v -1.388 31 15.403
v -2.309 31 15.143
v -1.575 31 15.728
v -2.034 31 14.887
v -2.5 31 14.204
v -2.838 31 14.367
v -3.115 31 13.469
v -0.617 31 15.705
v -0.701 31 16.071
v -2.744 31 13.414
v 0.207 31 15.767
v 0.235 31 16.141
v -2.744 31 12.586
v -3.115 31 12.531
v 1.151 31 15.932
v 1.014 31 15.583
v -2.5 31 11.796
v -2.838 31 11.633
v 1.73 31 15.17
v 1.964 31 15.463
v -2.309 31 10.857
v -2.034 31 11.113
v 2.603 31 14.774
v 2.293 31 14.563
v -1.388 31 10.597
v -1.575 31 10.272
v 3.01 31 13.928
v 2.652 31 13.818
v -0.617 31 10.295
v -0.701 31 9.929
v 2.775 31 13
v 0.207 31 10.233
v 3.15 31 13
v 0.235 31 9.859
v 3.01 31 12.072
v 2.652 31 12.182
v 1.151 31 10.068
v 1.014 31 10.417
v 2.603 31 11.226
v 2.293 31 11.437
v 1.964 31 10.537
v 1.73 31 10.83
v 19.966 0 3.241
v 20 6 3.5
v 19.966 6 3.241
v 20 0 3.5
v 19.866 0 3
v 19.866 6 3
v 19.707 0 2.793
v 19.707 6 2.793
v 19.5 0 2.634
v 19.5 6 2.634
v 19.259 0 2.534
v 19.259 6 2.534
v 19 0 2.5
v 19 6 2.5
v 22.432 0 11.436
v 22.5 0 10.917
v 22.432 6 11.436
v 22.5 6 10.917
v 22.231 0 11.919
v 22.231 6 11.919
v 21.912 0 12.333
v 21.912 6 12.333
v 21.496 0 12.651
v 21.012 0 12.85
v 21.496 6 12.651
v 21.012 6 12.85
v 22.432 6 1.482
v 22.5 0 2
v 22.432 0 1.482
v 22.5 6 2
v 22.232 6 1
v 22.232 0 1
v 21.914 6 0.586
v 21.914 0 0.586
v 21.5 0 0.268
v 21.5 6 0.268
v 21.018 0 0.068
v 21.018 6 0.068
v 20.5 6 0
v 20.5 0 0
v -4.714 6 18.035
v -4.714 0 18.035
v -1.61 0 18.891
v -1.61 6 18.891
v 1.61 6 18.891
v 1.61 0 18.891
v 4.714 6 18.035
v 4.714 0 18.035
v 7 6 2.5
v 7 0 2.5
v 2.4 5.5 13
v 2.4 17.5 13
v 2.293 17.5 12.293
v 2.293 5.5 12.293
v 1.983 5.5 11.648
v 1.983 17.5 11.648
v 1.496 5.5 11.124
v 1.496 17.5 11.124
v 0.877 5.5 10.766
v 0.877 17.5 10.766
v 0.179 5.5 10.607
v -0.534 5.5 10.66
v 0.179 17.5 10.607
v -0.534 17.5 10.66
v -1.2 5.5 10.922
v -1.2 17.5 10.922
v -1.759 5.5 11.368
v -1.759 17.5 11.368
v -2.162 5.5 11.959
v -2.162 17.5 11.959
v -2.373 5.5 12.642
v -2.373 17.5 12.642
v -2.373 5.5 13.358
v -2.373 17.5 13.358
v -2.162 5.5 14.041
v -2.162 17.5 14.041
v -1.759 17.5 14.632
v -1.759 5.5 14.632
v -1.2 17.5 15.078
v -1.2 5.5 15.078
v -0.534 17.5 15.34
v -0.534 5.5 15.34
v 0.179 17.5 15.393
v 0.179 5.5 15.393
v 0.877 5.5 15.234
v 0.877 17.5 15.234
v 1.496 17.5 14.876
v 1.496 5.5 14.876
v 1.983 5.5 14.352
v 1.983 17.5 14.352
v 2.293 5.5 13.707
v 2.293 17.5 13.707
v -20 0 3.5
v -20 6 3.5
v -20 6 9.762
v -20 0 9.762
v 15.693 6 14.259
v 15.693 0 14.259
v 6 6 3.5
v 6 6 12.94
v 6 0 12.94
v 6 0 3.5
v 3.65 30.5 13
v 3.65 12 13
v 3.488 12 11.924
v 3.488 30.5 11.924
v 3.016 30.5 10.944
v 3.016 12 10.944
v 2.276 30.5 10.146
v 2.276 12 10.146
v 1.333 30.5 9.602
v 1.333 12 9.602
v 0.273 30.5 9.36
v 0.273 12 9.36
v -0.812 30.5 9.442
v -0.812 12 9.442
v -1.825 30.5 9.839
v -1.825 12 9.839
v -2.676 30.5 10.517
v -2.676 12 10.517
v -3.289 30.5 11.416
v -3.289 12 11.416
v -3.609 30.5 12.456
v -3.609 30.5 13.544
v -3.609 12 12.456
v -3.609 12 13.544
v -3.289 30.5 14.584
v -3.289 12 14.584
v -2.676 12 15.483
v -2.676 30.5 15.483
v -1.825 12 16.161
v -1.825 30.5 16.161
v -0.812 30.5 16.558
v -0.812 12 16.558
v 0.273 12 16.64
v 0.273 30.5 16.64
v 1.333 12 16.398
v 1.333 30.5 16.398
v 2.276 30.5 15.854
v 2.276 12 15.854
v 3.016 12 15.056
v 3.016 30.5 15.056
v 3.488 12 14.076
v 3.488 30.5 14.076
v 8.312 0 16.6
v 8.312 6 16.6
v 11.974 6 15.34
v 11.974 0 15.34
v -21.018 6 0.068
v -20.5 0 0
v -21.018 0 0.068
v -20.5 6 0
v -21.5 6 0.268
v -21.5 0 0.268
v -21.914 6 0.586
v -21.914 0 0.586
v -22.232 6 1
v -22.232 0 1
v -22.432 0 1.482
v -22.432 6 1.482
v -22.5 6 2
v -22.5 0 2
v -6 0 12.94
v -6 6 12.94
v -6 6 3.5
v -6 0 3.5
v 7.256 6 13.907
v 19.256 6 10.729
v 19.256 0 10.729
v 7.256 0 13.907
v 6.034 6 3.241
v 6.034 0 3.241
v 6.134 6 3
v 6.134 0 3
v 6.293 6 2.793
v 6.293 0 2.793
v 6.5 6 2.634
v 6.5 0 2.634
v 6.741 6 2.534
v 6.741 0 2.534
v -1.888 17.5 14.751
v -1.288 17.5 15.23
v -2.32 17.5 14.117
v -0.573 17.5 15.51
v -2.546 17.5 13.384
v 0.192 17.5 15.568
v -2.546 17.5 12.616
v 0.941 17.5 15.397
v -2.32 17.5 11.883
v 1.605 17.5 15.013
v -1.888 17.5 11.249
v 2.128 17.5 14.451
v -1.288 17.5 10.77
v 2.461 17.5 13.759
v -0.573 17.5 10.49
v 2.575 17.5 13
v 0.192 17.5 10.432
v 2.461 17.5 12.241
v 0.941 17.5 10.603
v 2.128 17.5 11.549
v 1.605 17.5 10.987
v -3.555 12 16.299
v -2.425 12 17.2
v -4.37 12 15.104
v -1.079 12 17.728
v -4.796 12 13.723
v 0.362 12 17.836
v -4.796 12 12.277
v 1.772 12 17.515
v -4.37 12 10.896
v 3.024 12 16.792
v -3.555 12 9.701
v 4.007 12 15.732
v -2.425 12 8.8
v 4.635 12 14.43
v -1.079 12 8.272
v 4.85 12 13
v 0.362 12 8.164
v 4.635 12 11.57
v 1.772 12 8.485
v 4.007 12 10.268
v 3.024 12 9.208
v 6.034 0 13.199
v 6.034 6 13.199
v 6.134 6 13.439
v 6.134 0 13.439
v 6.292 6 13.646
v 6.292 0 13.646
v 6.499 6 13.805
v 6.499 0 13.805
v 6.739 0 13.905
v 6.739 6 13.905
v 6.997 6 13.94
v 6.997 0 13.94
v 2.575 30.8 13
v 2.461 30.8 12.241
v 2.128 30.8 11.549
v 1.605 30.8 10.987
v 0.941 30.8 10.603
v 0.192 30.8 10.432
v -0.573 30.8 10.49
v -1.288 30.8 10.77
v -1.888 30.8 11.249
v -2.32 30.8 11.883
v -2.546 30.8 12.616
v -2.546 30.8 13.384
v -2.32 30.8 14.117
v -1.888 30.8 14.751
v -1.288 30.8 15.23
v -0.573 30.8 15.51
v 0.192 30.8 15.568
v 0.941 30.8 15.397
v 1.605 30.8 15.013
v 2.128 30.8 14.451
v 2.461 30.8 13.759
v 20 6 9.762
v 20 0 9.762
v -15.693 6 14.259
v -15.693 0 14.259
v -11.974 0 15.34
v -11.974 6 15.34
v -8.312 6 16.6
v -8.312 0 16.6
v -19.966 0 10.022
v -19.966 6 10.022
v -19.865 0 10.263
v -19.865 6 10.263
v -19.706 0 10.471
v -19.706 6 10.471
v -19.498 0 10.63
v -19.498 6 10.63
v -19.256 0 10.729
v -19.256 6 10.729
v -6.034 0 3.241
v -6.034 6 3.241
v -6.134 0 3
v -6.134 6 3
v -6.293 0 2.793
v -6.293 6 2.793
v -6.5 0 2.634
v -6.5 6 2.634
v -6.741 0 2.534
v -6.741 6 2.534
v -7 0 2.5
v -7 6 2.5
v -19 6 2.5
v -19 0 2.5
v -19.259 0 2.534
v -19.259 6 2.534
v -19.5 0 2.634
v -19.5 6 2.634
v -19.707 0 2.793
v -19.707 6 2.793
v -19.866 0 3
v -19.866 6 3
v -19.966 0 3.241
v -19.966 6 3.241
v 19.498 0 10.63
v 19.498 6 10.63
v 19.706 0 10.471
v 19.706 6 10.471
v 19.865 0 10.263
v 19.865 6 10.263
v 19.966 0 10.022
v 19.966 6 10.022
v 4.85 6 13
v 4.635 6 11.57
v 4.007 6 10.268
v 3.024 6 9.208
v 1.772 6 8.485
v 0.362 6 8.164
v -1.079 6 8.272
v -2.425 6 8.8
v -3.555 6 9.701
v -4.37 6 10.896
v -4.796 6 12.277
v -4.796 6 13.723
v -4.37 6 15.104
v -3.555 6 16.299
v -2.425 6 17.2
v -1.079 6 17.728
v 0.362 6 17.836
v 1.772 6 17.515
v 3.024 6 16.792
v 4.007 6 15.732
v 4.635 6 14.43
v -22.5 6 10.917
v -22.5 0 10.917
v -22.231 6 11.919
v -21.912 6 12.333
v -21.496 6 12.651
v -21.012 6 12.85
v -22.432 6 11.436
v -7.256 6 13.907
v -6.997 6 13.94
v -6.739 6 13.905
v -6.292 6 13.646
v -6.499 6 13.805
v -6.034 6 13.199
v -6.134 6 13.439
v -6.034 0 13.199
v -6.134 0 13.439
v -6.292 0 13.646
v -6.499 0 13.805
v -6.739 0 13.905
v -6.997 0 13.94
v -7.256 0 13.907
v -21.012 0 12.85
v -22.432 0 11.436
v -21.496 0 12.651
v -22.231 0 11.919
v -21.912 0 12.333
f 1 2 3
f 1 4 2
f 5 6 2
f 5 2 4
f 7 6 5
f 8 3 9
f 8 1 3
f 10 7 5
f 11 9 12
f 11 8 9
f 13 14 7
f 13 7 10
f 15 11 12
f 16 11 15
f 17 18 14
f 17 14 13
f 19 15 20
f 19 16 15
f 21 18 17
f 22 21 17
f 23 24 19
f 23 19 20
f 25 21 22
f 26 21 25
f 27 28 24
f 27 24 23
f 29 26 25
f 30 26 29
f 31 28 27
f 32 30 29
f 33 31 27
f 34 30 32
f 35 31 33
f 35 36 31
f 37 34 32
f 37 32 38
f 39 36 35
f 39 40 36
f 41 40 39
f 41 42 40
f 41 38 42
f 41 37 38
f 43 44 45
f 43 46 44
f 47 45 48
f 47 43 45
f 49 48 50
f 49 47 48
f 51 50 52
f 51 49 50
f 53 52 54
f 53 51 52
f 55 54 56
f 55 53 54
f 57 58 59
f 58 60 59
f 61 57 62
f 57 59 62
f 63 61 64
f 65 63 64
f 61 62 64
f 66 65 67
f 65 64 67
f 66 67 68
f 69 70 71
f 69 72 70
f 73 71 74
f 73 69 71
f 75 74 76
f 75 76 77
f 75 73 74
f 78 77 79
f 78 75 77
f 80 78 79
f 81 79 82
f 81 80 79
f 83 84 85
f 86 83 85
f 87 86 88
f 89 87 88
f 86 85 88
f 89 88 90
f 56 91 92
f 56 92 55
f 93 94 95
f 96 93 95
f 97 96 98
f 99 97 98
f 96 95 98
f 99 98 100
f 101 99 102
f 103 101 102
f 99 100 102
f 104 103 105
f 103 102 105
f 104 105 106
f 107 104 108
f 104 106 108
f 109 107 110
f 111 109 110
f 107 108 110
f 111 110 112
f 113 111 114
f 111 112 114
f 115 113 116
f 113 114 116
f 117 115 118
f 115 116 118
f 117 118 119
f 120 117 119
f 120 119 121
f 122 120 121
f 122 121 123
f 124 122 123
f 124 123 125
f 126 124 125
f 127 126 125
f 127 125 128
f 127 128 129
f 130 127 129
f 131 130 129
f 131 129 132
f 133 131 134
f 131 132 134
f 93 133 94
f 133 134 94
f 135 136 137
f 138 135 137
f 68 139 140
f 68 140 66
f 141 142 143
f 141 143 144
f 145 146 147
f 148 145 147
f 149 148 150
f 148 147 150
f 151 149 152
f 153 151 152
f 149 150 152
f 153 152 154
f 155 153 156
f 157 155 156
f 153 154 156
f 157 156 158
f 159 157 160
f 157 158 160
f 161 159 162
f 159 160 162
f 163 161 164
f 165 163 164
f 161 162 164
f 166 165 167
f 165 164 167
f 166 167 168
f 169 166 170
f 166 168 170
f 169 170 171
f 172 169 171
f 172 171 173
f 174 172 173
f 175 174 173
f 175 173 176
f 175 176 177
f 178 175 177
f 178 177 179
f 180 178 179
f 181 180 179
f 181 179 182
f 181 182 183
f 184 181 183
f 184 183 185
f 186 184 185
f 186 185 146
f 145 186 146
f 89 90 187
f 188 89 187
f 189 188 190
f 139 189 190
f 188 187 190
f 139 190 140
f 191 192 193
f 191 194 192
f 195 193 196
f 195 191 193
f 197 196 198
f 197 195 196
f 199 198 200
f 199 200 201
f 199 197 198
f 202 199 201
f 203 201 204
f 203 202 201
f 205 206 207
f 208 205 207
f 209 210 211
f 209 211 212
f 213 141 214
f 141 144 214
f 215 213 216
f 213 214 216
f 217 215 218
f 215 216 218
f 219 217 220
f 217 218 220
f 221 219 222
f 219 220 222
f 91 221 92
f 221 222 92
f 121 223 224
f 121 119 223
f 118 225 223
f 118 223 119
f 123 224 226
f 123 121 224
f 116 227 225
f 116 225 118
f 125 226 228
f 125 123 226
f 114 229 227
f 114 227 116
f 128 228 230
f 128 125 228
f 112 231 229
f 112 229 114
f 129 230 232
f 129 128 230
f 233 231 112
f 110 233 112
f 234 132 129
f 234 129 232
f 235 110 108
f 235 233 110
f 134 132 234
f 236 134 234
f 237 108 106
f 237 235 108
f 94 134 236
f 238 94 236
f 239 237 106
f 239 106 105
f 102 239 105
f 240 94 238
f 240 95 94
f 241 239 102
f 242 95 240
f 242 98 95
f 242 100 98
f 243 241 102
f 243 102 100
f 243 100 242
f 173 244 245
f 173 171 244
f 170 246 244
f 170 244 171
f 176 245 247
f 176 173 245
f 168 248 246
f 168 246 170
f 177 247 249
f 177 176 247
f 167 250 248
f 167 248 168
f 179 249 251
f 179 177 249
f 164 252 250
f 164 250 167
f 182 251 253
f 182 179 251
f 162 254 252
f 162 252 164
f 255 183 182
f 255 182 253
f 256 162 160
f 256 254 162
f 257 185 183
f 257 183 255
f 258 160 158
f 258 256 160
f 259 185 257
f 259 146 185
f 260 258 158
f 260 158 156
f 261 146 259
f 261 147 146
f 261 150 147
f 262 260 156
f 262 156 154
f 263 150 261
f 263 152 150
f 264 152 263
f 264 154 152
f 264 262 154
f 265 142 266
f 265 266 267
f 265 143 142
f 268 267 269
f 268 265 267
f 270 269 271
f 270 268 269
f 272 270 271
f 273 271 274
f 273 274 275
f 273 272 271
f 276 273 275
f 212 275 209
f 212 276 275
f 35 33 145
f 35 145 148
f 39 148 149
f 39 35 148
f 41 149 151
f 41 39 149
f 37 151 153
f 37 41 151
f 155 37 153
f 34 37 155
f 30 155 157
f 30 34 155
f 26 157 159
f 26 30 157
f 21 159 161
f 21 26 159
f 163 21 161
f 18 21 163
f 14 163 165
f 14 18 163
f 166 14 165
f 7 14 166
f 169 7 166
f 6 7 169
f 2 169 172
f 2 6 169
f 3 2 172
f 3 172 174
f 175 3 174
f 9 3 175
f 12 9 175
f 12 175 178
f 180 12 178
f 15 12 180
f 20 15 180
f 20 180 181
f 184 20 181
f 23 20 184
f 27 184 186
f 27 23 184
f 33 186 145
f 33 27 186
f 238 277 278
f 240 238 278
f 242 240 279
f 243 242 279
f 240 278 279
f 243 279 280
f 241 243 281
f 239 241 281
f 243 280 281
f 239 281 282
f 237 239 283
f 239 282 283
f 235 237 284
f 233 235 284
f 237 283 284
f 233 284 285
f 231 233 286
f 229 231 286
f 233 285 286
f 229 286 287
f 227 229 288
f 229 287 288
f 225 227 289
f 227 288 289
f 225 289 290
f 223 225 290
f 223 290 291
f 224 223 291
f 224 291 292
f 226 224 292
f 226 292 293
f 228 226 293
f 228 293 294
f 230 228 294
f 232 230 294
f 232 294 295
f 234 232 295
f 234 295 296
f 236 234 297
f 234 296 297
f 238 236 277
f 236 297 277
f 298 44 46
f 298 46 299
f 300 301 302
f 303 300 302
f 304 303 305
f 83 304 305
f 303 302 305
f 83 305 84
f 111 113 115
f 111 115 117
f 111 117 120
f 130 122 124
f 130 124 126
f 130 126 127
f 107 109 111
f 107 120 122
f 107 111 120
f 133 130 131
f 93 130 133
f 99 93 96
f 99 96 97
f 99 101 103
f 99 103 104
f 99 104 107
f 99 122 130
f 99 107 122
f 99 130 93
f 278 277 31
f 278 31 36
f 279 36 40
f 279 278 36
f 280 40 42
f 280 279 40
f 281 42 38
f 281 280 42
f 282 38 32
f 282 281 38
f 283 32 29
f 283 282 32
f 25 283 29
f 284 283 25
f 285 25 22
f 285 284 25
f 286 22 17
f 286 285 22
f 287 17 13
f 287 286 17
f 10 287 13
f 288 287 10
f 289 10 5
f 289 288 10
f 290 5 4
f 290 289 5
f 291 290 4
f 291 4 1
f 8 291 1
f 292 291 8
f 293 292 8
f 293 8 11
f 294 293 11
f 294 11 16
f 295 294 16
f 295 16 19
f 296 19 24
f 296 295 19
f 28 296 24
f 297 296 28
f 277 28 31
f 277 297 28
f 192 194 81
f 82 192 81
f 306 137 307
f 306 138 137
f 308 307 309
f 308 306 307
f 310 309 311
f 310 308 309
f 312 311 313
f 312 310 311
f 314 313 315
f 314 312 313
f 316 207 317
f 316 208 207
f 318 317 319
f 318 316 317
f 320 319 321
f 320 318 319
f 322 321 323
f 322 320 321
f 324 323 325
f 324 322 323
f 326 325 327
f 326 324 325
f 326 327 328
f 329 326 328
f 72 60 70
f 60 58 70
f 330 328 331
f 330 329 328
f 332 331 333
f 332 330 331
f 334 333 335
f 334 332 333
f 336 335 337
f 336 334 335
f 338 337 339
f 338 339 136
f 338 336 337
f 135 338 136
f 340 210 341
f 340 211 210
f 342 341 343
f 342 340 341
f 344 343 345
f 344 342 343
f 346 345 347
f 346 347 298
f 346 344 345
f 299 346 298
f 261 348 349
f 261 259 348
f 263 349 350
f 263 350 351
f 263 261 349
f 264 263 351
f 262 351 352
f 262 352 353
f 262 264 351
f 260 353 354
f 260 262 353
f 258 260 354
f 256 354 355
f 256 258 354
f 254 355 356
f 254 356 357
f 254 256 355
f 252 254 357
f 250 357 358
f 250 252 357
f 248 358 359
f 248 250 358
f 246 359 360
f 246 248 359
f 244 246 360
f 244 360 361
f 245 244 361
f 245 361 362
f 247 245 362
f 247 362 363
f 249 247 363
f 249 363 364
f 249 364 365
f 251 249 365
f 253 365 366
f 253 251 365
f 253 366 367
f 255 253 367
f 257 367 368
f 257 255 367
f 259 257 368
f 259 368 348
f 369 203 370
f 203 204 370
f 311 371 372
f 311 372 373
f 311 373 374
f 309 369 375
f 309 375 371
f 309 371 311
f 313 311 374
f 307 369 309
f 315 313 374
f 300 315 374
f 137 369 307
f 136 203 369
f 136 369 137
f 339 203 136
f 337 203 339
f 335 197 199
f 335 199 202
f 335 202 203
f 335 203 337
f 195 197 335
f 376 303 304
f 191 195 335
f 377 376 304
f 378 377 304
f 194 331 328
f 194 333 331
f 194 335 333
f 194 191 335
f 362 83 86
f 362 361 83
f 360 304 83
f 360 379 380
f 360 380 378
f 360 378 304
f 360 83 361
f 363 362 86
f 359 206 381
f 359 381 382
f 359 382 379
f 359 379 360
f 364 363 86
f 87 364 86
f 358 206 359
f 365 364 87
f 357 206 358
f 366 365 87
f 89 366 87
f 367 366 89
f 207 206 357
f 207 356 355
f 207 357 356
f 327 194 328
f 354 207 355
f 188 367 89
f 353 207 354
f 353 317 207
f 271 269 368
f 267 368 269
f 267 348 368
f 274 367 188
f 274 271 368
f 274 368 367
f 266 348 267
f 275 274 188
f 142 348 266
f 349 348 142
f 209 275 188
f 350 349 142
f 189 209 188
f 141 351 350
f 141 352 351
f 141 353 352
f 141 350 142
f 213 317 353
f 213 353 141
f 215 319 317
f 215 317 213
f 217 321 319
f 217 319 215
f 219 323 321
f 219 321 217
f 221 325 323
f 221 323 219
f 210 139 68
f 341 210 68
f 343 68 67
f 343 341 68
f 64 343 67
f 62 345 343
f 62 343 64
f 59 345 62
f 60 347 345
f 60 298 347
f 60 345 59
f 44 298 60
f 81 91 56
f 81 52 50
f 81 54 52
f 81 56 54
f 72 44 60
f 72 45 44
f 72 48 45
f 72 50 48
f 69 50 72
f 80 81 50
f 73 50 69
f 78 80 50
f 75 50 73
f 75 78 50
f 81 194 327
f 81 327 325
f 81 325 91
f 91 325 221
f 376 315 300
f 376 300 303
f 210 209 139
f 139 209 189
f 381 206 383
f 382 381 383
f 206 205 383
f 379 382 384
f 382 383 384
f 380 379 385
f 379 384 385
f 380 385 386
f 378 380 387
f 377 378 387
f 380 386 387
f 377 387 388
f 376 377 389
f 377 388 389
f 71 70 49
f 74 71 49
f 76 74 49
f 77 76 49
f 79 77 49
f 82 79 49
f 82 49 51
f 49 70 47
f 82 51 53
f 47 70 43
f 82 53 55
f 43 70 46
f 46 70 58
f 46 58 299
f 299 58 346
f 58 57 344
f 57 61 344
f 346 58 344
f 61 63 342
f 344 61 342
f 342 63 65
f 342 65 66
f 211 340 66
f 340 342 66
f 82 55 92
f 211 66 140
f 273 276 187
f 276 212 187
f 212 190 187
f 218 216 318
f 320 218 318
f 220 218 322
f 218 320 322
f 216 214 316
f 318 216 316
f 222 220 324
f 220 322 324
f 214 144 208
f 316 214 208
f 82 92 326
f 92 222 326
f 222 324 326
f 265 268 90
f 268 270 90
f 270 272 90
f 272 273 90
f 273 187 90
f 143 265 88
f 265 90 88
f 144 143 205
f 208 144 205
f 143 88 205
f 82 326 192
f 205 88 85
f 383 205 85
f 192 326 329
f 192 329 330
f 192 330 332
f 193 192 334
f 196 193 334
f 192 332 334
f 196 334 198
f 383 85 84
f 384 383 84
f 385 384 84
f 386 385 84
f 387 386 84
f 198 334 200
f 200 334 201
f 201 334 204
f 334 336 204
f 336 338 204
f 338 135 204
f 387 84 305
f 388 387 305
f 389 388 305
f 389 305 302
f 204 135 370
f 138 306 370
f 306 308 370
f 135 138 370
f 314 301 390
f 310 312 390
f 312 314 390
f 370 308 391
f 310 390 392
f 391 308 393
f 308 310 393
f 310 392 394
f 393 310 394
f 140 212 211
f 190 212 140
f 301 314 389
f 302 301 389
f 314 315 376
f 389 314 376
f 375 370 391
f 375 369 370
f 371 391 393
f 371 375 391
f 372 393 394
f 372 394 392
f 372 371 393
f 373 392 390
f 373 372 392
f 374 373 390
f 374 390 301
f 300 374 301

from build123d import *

# Parameters (mm, degrees)
SKETCH2_W               = 45
SKETCH2_H               = 70
SKETCH2_W_2             = 25
SKETCH2_H_2             = 50
BOSS_EXTRUDE2_DEPTH     = 10
CUT_EXTRUDE1_REACH      = 72
BOSS_EXTRUDE3_DEPTH     = 10
SKETCH6_R               = 3.65
BOSS_EXTRUDE4_DEPTH     = 16
BOSS_EXTRUDE5_DEPTH     = 10
BOSS_EXTRUDE8_DEPTH     = 8
SKETCH9_W               = 6
SKETCH9_H               = 16.4
CUT_EXTRUDE2_DEPTH      = 6
CUT_EXTRUDE3_DEPTH      = 15.5
CUT_EXTRUDE3_DEPTH_BACK = 31.5
SKETCH11_W              = 63.799799384
SKETCH11_H              = 31.786722146
CUT_EXTRUDE4_DEPTH      = 77
SKETCH12_R              = 3.65
BOSS_EXTRUDE9_DEPTH     = 21
SKETCH13_R              = 4.85
SKETCH13_R_2            = 3.65
BOSS_EXTRUDE10_DEPTH    = 2
SKETCH14_R              = 4.85
CUT_EXTRUDE6_DEPTH      = 4
CUT_EXTRUDE7_DEPTH      = 7
FILLET1_R               = 1
SKETCH16_R              = 2.575
CUT_EXTRUDE8_DEPTH      = 13.5
CHAMFER1_SIZE           = 0.5
CHAMFER2_SIZE           = 0.2
SKETCH17_R              = 2.4
CUT_EXTRUDE9_DEPTH      = 12
FILLET2_R               = 2


with BuildPart() as part:
    # Sketch2 → Boss-Extrude2 (new body)
    with BuildSketch(Plane.XY):
        with Locations((0, 35)):
            Rectangle(SKETCH2_W, SKETCH2_H)
        with Locations((0, 35)):
            Rectangle(SKETCH2_W_2, SKETCH2_H_2, mode=Mode.SUBTRACT)
    extrude(amount=BOSS_EXTRUDE2_DEPTH)

    # Sketch3 → Cut-Extrude1 (cut, up to next)
    with BuildSketch(Plane(origin=(0, 70, 0), x_dir=(1, 0, 0), z_dir=(0, 1, 0)), mode=Mode.PRIVATE) as cut_extrude1_sk1:
        Polygon((-12, 0), (-12, -4), (-5, -4), (-5, -8), (5, -8), (5, -4), (12, -4), (12, 0), align=None)
    cut_extrude1_tool1 = extrude(cut_extrude1_sk1.sketch, amount=-CUT_EXTRUDE1_REACH, mode=Mode.PRIVATE) & part.part
    add(cut_extrude1_tool1.solids().sort_by_distance((0, 70, 3.176471))[0], mode=Mode.SUBTRACT)

    # Sketch4 → Boss-Extrude3 (add)
    with BuildSketch(Plane(origin=(0, 70, 0), x_dir=(1, 0, 0), z_dir=(0, 1, 0))):
        with BuildLine():
            Line((-12, -10), (12, -10))
            ThreePointArc((12, -10), (7.5, -11.5), (4.8, -15.4))
            ThreePointArc((4.8, -15.4), (0, -19), (-4.8, -15.4))
            ThreePointArc((-4.8, -15.4), (-7.5, -11.5), (-12, -10))
        make_face()
    extrude(amount=-BOSS_EXTRUDE3_DEPTH)

    # Sketch6 → Boss-Extrude4 (add)
    with BuildSketch(Plane(origin=(0, 70, 0), x_dir=(1, 0, 0), z_dir=(0, 1, 0))):
        with Locations((0, -13)):
            Circle(SKETCH6_R)
    extrude(amount=BOSS_EXTRUDE4_DEPTH)

    # Sketch7 → Boss-Extrude5 (add)
    with BuildSketch(Plane.XZ):
        with BuildLine():
            Line((-22.5, 10), (-22.5, 12.456100996))
            Line((-22.5, 12.456100996), (-15.693142744, 14.258664405))
            ThreePointArc((-15.693142744, 14.258664405), (-10.135286431, 15.948047702), (-4.714257706, 18.035206128))
            ThreePointArc((-4.714257706, 18.035206128), (0, 19), (4.714257706, 18.035206128))
            ThreePointArc((4.714257706, 18.035206128), (10.135286431, 15.948047702), (15.693142744, 14.258664405))
            Line((15.693142744, 14.258664405), (22.5, 12.456100996))
            Line((22.5, 12.456100996), (22.5, 10))
            Line((22.5, 10), (-22.5, 10))
        make_face()
    extrude(amount=-BOSS_EXTRUDE5_DEPTH)

    # Sketch8 → Boss-Extrude8 (add, symmetric)
    with BuildSketch(Plane(origin=(0, 0, 0), x_dir=(0, 0, -1), z_dir=(1, 0, 0))):
        Polygon((-19, 66.9), (-23, 66.9), (-23, 50.5), (-19.5, 50.5), (-10, 60), (-10, 66.9), align=None)
    extrude(amount=BOSS_EXTRUDE8_DEPTH, both=True)

    # Sketch9 → Cut-Extrude2 (cut)
    with BuildSketch(Plane.XY.offset(23)):
        with Locations((0, 58.7)):
            Rectangle(SKETCH9_W, SKETCH9_H)
    extrude(amount=-CUT_EXTRUDE2_DEPTH, mode=Mode.SUBTRACT)

    # Sketch10 → Cut-Extrude3 (cut, two sides)
    with BuildSketch(Plane.ZY.offset(8)) as cut_extrude3_sk:
        with BuildLine():
            Line((18.35, 64.4), (18.35, 54.4))
            ThreePointArc((18.35, 54.4), (20, 52.75), (21.65, 54.4))
            Line((21.65, 54.4), (21.65, 64.4))
            ThreePointArc((21.65, 64.4), (20, 66.05), (18.35, 64.4))
        make_face()
    extrude(amount=CUT_EXTRUDE3_DEPTH, mode=Mode.SUBTRACT)
    extrude(cut_extrude3_sk.sketch, amount=-CUT_EXTRUDE3_DEPTH_BACK, mode=Mode.SUBTRACT)

    # Sketch11 → Cut-Extrude4 (cut, through all)
    with BuildSketch(Plane(origin=(0, 10, 0), x_dir=(1, 0, 0), z_dir=(0, 1, 0))):
        with Locations((-0.274859754, -9.346463675)):
            Rectangle(SKETCH11_W, SKETCH11_H)
    extrude(amount=CUT_EXTRUDE4_DEPTH, mode=Mode.SUBTRACT)

    # Sketch12 → Boss-Extrude9 (add)
    with BuildSketch(Plane(origin=(0, 10, 0), x_dir=(1, 0, 0), z_dir=(0, 1, 0))):
        with Locations((0, -13)):
            Circle(SKETCH12_R)
    extrude(amount=BOSS_EXTRUDE9_DEPTH)

    # Sketch13 → Boss-Extrude10 (add)
    with BuildSketch(Plane(origin=(0, 10, 0), x_dir=(1, 0, 0), z_dir=(0, 1, 0))):
        with Locations((0, -13)):
            Circle(SKETCH13_R)
        with Locations((0, -13)):
            Circle(SKETCH13_R_2, mode=Mode.SUBTRACT)
    extrude(amount=BOSS_EXTRUDE10_DEPTH)

    # Sketch14 → Cut-Extrude6 (cut)
    with BuildSketch(Plane(origin=(0, 10, 0), x_dir=(1, 0, 0), z_dir=(0, 1, 0))):
        with BuildLine():
            Line((22.5, -12.456100996), (22.5, 0))
            Line((22.5, 0), (-22.5, 0))
            Line((-22.5, 0), (-22.5, -12.456100996))
            Line((-22.5, -12.456100996), (-15.693142744, -14.258664405))
            ThreePointArc((-15.693142744, -14.258664405), (-10.135286431, -15.948047702), (-4.714257706, -18.035206128))
            ThreePointArc((-4.714257706, -18.035206128), (0, -19), (4.714257706, -18.035206128))
            ThreePointArc((4.714257706, -18.035206128), (10.135286431, -15.948047702), (15.693142744, -14.258664405))
            Line((15.693142744, -14.258664405), (22.5, -12.456100996))
        make_face()
        with Locations((0, -13)):
            Circle(SKETCH14_R, mode=Mode.SUBTRACT)
    extrude(amount=-CUT_EXTRUDE6_DEPTH, mode=Mode.SUBTRACT)

    # Sketch15 → Cut-Extrude7 (cut, through all)
    with BuildSketch(Plane(origin=(0, 6, 0), x_dir=(1, 0, 0), z_dir=(0, 1, 0))):
        Polygon((6, -2.5), (20, -2.5), (20, -10.531966446), (6, -14.239387769), align=None)
        Polygon((-6, -14.239387769), (-6, -2.5), (-20, -2.5), (-20, -10.531966446), align=None)
    extrude(amount=-CUT_EXTRUDE7_DEPTH, mode=Mode.SUBTRACT)

    # Fillet1
    fillet1_edges = [part.edges().sort_by_distance(p)[0] for p in [
        (20, 3, 2.5),
        (20, 3, 10.531966446),
        (6, 3, 14.239387769),
        (6, 3, 2.5),
        (-6, 3, 14.239387769),
        (-20, 3, 10.531966446),
        (-20, 3, 2.5),
        (-6, 3, 2.5),
    ]]
    fillet(fillet1_edges, radius=FILLET1_R)

    # Sketch16 → Cut-Extrude8 (cut)
    with BuildSketch(Plane(origin=(0, 31, 0), x_dir=(1, 0, 0), z_dir=(0, 1, 0))):
        with Locations((0, -13)):
            Circle(SKETCH16_R)
    extrude(amount=-CUT_EXTRUDE8_DEPTH, mode=Mode.SUBTRACT)

    # Chamfer1
    chamfer1_edges = [part.edges().sort_by_distance(p)[0] for p in [
        (-3.65, 31, 13),
    ]]
    chamfer(chamfer1_edges, length=CHAMFER1_SIZE)

    # Chamfer2
    chamfer2_edges = [part.edges().sort_by_distance(p)[0] for p in [
        (-2.575, 31, 13),
    ]]
    chamfer(chamfer2_edges, length=CHAMFER2_SIZE)

    # Sketch17 → Cut-Extrude9 (cut)
    with BuildSketch(Plane(origin=(0, 17.5, 0), x_dir=(1, 0, 0), z_dir=(0, 1, 0))):
        with Locations((0, -13)):
            Circle(SKETCH17_R)
    extrude(amount=-CUT_EXTRUDE9_DEPTH, mode=Mode.SUBTRACT)

    # Fillet2
    fillet2_edges = [part.edges().sort_by_distance(p)[0] for p in [
        (-22.5, 3, 12.456100996),
        (22.5, 3, 12.456100996),
        (-22.5, 3, 0),
        (22.5, 3, 0),
    ]]
    fillet(fillet2_edges, radius=FILLET2_R)


solid = part.part
